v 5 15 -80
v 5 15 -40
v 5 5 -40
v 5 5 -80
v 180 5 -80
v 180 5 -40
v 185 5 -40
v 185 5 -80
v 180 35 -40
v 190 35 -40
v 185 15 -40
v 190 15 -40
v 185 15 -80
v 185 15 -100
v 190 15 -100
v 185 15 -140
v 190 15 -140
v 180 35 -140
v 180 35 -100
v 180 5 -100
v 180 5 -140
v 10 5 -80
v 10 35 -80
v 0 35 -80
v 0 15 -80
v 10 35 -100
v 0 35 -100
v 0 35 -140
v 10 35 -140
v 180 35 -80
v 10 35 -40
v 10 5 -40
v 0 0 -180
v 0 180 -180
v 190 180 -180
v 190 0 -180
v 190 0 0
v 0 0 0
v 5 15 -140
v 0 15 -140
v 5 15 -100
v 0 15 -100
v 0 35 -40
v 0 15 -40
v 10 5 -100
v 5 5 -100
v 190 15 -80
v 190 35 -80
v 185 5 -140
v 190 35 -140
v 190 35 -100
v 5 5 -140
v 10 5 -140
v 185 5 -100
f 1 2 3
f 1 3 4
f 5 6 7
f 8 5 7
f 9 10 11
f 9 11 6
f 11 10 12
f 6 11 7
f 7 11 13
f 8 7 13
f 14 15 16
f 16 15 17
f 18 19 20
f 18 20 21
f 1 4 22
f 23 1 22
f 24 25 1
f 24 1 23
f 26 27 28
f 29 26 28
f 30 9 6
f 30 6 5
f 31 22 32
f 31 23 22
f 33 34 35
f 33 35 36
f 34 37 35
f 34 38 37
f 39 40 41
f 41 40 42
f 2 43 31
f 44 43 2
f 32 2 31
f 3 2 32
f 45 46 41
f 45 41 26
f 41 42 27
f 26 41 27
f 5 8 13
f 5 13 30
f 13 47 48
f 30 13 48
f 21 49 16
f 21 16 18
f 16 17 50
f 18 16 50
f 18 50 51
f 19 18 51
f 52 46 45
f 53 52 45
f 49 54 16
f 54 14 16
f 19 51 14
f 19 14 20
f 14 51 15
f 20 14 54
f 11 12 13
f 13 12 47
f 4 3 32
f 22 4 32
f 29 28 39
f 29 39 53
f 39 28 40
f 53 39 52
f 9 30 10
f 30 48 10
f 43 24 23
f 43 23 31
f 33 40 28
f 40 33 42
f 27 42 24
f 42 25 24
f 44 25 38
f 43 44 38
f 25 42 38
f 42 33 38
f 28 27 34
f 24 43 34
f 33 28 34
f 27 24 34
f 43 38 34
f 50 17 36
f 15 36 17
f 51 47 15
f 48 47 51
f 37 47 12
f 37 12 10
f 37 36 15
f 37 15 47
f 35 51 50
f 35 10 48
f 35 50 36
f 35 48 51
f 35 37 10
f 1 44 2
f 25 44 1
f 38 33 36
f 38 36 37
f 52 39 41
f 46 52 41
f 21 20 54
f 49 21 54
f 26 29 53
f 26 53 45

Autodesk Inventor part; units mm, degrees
ref_plane "YZ Plane" through (0, 0, 0) normal (1, 0, 0) x (0, 1, 0)
ref_plane "XZ Plane" through (0, 0, 0) normal (0, 1, 0) x (-1, 0, 0)
ref_plane "XY Plane" through (0, 0, 0) normal (0, 0, 1) x (1, 0, 0)
sketch "스케치1" plane through (0, 0, 0) normal (1, 0, 0) x (0, 1, 0)
  line L0 (0, 0) -> (180, 0)
  line L1 (180, 0) -> (180, -180)
  line L2 (180, -180) -> (0, -180)
  line L3 (0, -180) -> (0, 0)
  line L4 (0, 0) -> (180, -180)
  dimension "d0" = 180
  dimension "d1" = 180
extrude "돌출1" add sketch "스케치1" along normal blind 190 contours L4 L2 L3
sketch "스케치2" plane through (0, 0, 0) normal (-1, 0, 0) x (0, 0, 1)
  line L0 (-140, 15) -> (-100, 15)
  line L1 (-100, 15) -> (-100, 35)
  line L2 (-100, 35) -> (-140, 35)
  line L3 (-140, 35) -> (-140, 15)
  line L4 (-80, 35) -> (-40, 35)
  line L5 (-40, 35) -> (-40, 15)
  line L6 (-40, 15) -> (-80, 15)
  line L7 (-80, 15) -> (-80, 35)
  line L8 (-180, 0) -> (-180, 180) projected
  line L9 (0, 0) -> (-180, 0) projected
  point P0 (-140, 25)
  point P1 (-80, 25)
  dimension "d4" = 40
  dimension "d5" = 20
  dimension "d6" = 40
  dimension "d7" = 20
  dimension "d8" = 40
  dimension "d9" = 20
  dimension "d10" = 15
  dimension "d11" = 15
  dimension "d46" = 40
extrude "돌출2" cut sketch "스케치2" against normal blind 10
sketch "스케치3" plane through (0, 15, -40) normal (0, 1, 0) x (1, 0, 0)
  line L0 (10, 0) -> (10, 40) projected
  line L1 (10, 0) -> (5, 0)
  line L2 (5, 0) -> (5, 40)
  line L3 (5, 40) -> (10, 40)
  line L4 (10, 40) -> (10, 0)
  line L5 (10, 100) -> (5, 100)
  line L6 (5, 100) -> (5, 60)
  line L7 (5, 60) -> (10, 60)
  line L8 (10, 60) -> (10, 100)
  point P0 (0, -40)
  dimension "d14" = 5
  dimension "d15" = 40
  dimension "d16" = 5
  dimension "d17" = 40
extrude "돌출3" cut sketch "스케치3" against normal blind 10
sketch "스케치4" plane through (190, 0, 0) normal (1, 0, 0) x (0, 0, -1)
  line L0 (140, 35) -> (100, 35)
  line L1 (100, 35) -> (100, 15)
  line L2 (100, 15) -> (140, 15)
  line L3 (140, 15) -> (140, 35)
  line L4 (80, 35) -> (40, 35)
  line L5 (40, 35) -> (40, 15)
  line L6 (40, 15) -> (80, 15)
  line L7 (80, 15) -> (80, 35)
  line L8 (180, 0) -> (180, 180) projected
  line L9 (0, 0) -> (180, 0) projected
  point P0 (140, 25)
  dimension "d20" = 40
  dimension "d21" = 20
  dimension "d22" = 40
  dimension "d23" = 20
  dimension "d24" = 20
  dimension "d25" = 40
  dimension "d26" = 15
extrude "돌출4" cut sketch "스케치4" against normal blind 10
sketch "스케치5" plane through (190, 15, -40) normal (0, 1, 0) x (1, 0, 0)
  line L0 (0, 0) -> (-10, 0) projected
  line L1 (-10, 0) -> (-5, 0)
  line L2 (-5, 0) -> (-5, 40)
  line L3 (-5, 40) -> (-10, 40)
  line L4 (-10, 40) -> (-10, 0)
  line L5 (-10, 60) -> (-5, 60)
  line L6 (-5, 60) -> (-5, 100)
  line L7 (-5, 100) -> (-10, 100)
  line L8 (-10, 100) -> (-10, 60)
  point P0 (-190, -40)
  dimension "d29" = 5
  dimension "d30" = 40
  dimension "d31" = 5
  dimension "d32" = 40
extrude "돌출5" cut sketch "스케치5" against normal blind 10
properties part number "ramp_3D 인쇄"
